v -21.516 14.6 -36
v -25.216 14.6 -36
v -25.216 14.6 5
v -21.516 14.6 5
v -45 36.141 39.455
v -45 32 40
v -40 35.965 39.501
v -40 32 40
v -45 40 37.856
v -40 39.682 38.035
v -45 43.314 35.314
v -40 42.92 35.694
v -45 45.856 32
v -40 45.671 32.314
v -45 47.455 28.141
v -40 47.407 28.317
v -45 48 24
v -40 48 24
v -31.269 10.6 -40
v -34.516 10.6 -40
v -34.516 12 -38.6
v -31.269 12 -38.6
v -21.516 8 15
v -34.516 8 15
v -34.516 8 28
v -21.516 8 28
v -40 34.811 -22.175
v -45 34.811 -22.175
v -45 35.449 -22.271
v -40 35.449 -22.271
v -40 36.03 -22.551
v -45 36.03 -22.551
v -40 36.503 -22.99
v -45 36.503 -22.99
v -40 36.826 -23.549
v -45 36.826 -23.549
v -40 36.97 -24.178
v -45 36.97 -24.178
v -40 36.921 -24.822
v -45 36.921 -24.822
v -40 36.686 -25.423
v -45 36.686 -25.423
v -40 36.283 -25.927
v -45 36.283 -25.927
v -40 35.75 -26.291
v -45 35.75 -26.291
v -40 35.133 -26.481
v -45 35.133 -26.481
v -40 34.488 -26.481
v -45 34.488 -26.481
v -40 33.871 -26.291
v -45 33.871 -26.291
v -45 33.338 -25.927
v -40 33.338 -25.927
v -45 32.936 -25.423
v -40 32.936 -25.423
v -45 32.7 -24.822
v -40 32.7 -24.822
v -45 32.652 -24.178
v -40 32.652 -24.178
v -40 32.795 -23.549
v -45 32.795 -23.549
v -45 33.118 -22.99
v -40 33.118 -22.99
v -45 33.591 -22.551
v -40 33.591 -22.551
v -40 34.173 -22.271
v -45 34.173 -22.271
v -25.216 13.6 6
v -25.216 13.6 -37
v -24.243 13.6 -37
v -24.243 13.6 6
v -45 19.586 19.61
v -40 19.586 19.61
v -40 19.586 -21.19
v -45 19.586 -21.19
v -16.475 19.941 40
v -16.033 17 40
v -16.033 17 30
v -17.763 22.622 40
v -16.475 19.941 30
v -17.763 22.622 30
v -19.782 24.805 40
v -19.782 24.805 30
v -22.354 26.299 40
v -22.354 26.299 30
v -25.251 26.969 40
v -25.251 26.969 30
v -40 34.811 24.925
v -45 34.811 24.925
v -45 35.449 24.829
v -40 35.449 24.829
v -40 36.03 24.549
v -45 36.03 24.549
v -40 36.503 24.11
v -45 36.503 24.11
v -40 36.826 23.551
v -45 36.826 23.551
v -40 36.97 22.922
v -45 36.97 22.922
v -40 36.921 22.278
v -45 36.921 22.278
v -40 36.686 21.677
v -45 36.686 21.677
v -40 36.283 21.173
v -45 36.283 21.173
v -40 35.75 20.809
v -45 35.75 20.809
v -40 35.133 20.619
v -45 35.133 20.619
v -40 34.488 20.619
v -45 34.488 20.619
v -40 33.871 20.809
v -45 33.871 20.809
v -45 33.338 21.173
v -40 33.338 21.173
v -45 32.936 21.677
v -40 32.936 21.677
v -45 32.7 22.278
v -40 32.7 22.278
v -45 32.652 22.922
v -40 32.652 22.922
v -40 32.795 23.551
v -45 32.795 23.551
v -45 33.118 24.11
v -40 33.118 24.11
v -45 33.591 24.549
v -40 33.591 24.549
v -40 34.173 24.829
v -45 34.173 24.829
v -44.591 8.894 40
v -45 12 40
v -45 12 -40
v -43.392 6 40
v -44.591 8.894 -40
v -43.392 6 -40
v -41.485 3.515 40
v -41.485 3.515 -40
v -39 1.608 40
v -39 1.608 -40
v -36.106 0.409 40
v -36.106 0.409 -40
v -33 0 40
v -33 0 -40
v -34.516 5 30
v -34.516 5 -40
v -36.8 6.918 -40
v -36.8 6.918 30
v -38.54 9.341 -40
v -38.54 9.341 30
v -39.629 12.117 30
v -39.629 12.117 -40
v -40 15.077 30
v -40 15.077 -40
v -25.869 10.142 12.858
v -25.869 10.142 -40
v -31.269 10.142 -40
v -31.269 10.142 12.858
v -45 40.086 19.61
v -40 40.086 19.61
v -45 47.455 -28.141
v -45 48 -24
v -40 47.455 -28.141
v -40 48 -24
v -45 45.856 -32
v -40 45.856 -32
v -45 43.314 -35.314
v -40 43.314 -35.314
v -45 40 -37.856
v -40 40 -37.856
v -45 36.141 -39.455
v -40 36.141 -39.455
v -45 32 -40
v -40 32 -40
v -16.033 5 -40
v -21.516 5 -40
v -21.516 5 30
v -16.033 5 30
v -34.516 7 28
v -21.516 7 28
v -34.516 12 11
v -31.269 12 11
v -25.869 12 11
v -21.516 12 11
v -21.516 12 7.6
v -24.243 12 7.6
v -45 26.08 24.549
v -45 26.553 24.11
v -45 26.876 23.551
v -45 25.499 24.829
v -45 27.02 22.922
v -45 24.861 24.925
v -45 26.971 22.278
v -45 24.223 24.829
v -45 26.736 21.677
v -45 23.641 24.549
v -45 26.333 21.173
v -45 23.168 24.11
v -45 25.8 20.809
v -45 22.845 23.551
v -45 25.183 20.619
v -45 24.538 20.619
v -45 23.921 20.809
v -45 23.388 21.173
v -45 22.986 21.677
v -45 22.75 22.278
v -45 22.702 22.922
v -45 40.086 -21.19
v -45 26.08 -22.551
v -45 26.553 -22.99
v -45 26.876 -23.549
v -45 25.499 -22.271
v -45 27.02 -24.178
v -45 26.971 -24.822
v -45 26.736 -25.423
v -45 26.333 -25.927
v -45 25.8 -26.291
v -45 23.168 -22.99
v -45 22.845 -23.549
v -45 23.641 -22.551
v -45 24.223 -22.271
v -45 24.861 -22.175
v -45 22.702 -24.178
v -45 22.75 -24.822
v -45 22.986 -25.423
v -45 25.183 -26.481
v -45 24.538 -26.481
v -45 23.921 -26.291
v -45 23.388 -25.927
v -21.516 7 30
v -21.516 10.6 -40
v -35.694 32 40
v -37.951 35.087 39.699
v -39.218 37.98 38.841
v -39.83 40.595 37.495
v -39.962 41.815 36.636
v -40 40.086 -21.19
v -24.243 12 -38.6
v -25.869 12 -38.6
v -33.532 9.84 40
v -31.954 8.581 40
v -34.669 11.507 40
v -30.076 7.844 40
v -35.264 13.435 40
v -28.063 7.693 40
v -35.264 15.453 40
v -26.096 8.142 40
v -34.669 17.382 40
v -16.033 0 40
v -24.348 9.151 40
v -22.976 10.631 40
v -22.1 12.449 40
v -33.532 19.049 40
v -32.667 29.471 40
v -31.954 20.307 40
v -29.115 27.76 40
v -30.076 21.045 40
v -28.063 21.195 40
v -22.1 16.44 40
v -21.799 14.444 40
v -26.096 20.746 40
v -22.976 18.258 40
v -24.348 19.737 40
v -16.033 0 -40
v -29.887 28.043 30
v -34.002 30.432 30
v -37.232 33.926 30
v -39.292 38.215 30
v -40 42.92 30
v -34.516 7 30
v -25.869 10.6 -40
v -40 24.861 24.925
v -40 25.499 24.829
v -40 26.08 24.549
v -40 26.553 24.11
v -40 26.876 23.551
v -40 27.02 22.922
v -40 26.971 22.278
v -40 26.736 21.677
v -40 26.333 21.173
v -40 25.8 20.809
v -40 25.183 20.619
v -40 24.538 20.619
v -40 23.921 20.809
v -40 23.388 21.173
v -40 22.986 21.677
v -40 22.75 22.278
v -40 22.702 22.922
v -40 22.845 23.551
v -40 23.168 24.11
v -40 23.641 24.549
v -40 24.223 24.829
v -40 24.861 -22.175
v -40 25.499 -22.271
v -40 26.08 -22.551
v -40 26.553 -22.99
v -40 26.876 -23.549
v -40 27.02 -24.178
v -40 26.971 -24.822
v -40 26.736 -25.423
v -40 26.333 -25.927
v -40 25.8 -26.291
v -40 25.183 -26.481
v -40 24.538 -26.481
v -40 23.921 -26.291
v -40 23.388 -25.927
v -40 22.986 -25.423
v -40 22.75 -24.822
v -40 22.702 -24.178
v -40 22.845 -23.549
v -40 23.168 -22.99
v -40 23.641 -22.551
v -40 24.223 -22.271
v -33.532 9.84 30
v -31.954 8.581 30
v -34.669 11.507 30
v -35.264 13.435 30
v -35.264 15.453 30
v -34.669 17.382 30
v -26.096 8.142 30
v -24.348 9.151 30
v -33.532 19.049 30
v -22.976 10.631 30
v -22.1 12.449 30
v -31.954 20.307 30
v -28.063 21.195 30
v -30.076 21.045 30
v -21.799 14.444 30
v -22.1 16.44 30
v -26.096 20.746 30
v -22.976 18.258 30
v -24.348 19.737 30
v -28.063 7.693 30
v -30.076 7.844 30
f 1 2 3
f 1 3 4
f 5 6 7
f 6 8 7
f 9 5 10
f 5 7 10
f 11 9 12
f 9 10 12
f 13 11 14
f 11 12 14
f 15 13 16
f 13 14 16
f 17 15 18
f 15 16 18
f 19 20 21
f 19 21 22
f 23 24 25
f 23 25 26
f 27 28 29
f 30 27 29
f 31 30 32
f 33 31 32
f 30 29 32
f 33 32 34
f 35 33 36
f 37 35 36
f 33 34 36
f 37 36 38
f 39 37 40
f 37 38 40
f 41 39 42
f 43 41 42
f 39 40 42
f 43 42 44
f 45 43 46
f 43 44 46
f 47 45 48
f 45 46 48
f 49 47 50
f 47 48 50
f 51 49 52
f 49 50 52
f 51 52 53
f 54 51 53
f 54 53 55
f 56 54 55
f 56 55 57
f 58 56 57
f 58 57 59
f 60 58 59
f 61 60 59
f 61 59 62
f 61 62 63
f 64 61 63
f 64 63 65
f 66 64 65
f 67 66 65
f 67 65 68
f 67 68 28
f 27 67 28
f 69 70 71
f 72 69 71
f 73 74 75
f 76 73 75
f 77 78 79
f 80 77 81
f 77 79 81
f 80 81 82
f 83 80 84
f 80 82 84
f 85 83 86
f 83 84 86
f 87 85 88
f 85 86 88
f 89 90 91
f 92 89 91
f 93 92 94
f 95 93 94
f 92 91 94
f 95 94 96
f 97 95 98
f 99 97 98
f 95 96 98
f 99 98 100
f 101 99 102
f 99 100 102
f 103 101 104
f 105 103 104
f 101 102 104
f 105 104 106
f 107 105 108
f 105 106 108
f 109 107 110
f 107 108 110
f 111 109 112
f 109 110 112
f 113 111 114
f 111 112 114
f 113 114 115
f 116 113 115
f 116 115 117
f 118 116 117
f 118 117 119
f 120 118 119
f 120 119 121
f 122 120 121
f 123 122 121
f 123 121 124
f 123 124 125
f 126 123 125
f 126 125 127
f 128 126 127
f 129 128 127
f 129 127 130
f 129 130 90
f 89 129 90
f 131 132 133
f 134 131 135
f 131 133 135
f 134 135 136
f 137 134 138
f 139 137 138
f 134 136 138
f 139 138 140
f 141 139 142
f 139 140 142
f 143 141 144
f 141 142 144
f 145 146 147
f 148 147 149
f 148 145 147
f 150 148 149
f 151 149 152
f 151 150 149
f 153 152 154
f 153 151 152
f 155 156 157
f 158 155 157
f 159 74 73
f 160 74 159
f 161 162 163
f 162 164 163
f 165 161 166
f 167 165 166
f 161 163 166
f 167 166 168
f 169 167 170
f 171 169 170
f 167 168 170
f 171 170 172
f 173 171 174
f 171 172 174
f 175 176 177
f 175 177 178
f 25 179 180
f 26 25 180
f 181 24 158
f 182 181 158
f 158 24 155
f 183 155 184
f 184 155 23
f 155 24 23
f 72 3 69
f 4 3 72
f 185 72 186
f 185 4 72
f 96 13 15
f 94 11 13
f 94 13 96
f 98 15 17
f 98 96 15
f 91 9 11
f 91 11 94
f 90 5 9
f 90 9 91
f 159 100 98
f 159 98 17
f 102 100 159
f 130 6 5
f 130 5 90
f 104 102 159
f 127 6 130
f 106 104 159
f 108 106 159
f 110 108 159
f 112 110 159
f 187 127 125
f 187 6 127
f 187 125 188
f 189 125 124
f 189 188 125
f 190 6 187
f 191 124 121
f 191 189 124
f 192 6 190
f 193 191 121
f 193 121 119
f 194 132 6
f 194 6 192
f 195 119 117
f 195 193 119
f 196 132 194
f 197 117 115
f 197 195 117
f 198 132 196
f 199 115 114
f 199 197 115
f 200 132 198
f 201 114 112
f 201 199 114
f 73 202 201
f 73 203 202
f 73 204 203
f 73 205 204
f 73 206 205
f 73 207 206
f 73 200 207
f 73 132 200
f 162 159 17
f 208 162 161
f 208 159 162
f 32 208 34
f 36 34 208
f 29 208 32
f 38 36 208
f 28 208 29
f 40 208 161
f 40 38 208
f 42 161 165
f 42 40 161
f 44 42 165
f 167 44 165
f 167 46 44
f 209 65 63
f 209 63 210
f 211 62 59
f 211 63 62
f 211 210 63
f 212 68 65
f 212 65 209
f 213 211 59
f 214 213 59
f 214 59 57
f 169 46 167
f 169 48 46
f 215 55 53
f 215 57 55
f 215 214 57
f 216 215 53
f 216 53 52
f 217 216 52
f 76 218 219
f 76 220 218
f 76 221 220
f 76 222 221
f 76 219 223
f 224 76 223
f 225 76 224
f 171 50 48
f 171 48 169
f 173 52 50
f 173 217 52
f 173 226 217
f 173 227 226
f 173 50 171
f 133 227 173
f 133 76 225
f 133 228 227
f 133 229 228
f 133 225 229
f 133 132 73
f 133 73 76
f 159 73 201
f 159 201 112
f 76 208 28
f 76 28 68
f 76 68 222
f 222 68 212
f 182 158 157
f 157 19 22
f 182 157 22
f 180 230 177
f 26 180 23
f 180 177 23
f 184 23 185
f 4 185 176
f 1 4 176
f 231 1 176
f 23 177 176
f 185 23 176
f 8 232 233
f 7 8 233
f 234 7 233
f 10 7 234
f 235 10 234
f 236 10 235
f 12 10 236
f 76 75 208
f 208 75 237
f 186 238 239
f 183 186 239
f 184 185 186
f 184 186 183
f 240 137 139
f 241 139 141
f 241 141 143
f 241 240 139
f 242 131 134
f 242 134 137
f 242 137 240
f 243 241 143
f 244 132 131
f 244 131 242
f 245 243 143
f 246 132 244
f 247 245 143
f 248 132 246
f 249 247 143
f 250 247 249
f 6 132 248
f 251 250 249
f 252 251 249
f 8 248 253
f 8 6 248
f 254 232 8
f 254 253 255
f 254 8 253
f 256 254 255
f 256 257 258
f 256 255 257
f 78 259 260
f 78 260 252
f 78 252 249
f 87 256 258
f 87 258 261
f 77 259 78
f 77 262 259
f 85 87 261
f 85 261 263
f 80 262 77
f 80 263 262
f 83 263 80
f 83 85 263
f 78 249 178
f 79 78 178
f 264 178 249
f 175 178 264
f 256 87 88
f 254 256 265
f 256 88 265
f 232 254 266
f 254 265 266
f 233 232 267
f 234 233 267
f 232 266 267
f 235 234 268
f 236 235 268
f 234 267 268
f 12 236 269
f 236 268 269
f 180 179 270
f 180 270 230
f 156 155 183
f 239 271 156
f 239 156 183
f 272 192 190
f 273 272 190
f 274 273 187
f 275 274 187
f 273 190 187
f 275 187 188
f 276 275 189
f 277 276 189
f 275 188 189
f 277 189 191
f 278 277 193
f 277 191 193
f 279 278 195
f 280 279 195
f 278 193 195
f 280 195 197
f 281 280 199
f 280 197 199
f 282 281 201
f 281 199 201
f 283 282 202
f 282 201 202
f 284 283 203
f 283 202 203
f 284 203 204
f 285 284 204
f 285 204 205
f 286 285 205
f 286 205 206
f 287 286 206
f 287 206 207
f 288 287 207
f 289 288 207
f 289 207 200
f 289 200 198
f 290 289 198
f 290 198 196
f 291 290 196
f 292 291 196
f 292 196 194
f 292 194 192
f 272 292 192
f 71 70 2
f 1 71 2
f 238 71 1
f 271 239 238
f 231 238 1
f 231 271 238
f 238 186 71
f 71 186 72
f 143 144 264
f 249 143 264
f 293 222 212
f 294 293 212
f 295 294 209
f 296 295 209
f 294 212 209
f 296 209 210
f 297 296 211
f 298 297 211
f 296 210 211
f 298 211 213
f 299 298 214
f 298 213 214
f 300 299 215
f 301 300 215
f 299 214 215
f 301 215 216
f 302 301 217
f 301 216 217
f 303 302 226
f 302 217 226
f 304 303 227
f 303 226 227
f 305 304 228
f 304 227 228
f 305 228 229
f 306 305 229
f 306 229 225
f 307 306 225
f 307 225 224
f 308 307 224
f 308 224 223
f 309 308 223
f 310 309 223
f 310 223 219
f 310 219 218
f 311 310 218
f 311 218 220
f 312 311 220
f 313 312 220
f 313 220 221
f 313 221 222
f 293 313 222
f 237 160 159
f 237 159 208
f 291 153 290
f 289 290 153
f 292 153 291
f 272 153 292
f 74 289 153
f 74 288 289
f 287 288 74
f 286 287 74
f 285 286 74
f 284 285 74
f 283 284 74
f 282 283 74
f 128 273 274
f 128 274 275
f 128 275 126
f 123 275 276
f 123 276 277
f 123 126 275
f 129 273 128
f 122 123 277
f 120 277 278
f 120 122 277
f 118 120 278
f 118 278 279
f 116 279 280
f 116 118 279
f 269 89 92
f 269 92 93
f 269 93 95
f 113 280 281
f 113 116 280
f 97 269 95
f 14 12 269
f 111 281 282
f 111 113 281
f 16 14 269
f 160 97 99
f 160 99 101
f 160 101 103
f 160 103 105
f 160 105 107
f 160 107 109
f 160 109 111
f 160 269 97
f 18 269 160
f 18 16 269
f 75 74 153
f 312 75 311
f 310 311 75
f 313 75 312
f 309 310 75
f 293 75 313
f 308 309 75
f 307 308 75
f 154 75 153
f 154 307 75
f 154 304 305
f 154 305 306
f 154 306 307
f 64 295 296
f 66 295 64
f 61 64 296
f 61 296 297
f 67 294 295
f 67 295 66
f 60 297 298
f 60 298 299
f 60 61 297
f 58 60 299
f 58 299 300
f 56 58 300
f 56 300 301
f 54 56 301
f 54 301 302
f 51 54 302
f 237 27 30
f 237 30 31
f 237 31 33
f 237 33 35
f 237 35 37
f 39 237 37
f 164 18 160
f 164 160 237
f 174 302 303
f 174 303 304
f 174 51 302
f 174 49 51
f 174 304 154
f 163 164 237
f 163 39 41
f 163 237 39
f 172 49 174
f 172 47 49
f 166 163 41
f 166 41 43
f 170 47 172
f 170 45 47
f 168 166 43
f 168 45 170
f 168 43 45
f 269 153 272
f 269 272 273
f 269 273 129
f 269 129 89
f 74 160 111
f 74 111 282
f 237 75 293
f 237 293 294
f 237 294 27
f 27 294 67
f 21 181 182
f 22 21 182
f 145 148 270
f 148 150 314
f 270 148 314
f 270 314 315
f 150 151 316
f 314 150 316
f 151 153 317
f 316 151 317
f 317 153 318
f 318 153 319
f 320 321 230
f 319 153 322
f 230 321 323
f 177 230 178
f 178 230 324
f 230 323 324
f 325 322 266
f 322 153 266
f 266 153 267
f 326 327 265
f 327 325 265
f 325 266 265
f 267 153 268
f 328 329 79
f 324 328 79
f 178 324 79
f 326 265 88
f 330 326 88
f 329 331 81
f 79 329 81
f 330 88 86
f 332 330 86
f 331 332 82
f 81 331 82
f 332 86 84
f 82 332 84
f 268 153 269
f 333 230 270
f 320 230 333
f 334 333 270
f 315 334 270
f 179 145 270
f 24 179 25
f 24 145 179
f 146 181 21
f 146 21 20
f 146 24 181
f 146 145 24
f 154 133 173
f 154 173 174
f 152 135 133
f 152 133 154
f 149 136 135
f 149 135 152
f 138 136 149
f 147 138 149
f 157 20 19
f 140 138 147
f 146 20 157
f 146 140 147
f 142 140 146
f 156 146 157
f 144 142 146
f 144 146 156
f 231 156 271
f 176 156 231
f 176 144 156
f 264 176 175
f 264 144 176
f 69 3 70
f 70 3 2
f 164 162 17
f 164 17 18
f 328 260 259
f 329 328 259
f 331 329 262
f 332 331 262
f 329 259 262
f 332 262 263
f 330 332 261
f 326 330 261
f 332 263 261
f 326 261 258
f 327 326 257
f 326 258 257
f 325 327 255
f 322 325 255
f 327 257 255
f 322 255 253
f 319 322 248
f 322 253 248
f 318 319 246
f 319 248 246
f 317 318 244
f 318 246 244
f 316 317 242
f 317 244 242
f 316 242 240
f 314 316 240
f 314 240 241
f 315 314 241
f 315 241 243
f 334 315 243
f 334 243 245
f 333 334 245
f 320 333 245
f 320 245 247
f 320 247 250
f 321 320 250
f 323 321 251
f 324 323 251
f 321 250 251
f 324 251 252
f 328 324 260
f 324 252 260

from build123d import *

# Parameters (mm, degrees)
CROQUIS1_W              = 90
CROQUIS1_H              = 80
SALIENTE_EXTRUIR1_DEPTH = 50
CROQUIS2_W              = 85
CROQUIS2_H              = 80
CORTAR_EXTRUIR1_DEPTH   = 23
CROQUIS3_W              = 61.032840672
CROQUIS3_H              = 80
CORTAR_EXTRUIR2_DEPTH   = 32
CROQUIS4_W              = 23.967159328
CROQUIS4_H              = 70
CORTAR_EXTRUIR3_DEPTH   = 22
CROQUIS7_R              = 6.77
CORTAR_EXTRUIR6_DEPTH   = 10
CROQUIS11_W             = 13
CROQUIS11_H             = 70
SALIENTE_EXTRUIR2_DEPTH = 2
CROQUIS12_W             = 13
CROQUIS12_H             = 55
SALIENTE_EXTRUIR3_DEPTH = 5
REDONDEO3_R             = 12
REDONDEO4_R             = 12
CROQUIS14_W             = 13
CROQUIS14_H             = 13
SALIENTE_EXTRUIR4_DEPTH = 1
CROQUIS17_W             = 2.726828244
CROQUIS17_H             = 50
SALIENTE_EXTRUIR5_DEPTH = 1.6
CROQUIS18_W             = 5
CROQUIS18_H             = 50
SALIENTE_EXTRUIR6_DEPTH = 1
CHAFL_N2_SIZE           = 4
CHAFL_N4_SIZE           = 4
CROQUIS19_R             = 2.165
CORTAR_EXTRUIR10_DEPTH  = 10
CROQUIS20_W             = 5.4
CROQUIS20_H             = 1.857846889
CORTAR_EXTRUIR11_DEPTH  = 80
REDONDEO10_R            = 10
CROQUIS23_W             = 40.8
CROQUIS23_H             = 20.5
CORTAR_EXTRUIR12_DEPTH  = 22
CROQUIS24_W             = 5
CROQUIS24_H             = 80
CORTAR_EXTRUIR14_DEPTH  = 2
REDONDEO13_R            = 16
REDONDEO14_START        = 30
REDONDEO14_DEPTH        = 2.2192
REDONDEO14_START_2      = 32.2192
REDONDEO14_2_DEPTH      = 7.7808
REDONDEO14_START_3      = -40
REDONDEO14_3_DEPTH      = 14.749021125
CORTAR_EXTRUIR16_DEPTH  = 1.3
CHAFL_N5_SIZE           = 5


with BuildPart() as part:
    # Croquis1 → Saliente-Extruir1 (new body)
    with BuildSketch(Plane(origin=(0, 0, 0), x_dir=(1, 0, 0), z_dir=(0, 1, 0))):
        Rectangle(CROQUIS1_W, CROQUIS1_H)
    extrude(amount=SALIENTE_EXTRUIR1_DEPTH)

    # Croquis2 → Cortar-Extruir1 (cut)
    with BuildSketch(Plane(origin=(0, 50, 0), x_dir=(1, 0, 0), z_dir=(0, 1, 0))):
        with Locations((2.5, 0)):
            Rectangle(CROQUIS2_W, CROQUIS2_H)
    extrude(amount=-CORTAR_EXTRUIR1_DEPTH, mode=Mode.SUBTRACT)

    # Croquis3 → Cortar-Extruir2 (cut)
    with BuildSketch(Plane(origin=(0, 27, 0), x_dir=(1, 0, 0), z_dir=(0, 1, 0))):
        with Locations((14.483579664, 0)):
            Rectangle(CROQUIS3_W, CROQUIS3_H)
    extrude(amount=-CORTAR_EXTRUIR2_DEPTH, mode=Mode.SUBTRACT)

    # Croquis4 → Cortar-Extruir3 (cut)
    with BuildSketch(Plane(origin=(0, 27, 0), x_dir=(1, 0, 0), z_dir=(0, 1, 0))):
        with Locations((-28.016420336, 5)):
            Rectangle(CROQUIS4_W, CROQUIS4_H)
    extrude(amount=-CORTAR_EXTRUIR3_DEPTH, mode=Mode.SUBTRACT)

    # Croquis7 → Cortar-Extruir6 (cut)
    with BuildSketch(Plane.XY.offset(40)):
        with Locations((-28.569213332, 14.444335644)):
            Circle(CROQUIS7_R)
    extrude(amount=-CORTAR_EXTRUIR6_DEPTH, mode=Mode.SUBTRACT)

    # Croquis11 → Saliente-Extruir2 (add)
    with BuildSketch(Plane(origin=(0, 5, 0), x_dir=(1, 0, 0), z_dir=(0, 1, 0))):
        with Locations((-28.016420336, 5)):
            Rectangle(CROQUIS11_W, CROQUIS11_H)
    extrude(amount=SALIENTE_EXTRUIR2_DEPTH)

    # Croquis12 → Saliente-Extruir3 (add)
    with BuildSketch(Plane(origin=(0, 7, 0), x_dir=(1, 0, 0), z_dir=(0, 1, 0))):
        with Locations((-28.016420336, 12.5)):
            Rectangle(CROQUIS12_W, CROQUIS12_H)
    extrude(amount=SALIENTE_EXTRUIR3_DEPTH)

    # Redondeo3
    # the kernel refuses this fillet: 12 mm, written as the material it adds along each edge
    with BuildSketch(Plane(origin=(-40, 5, 30), x_dir=(1.0, 1.01847082473682e-12, 0), z_dir=(0, 0, -1))) as redondeo3_piece_1:
        with BuildLine():
            CenterArc((12, -10.076520531), REDONDEO3_R, 122.890486336, 57.109513664)
            Line((0, -10.076520531), (-0.24, -10.076520531))
            Line((-0.24, -10.076520531), (-0.24, 0))
            Line((-0.24, 0), (0, 0.24))
            ThreePointArc((0, 0.24), (2.741789832, 0.24), (5.353251257, 0.201530411))
            Line((5.353251257, 0.201530411), (5.483579664, 0))
        make_face()
    extrude(amount=70)

    # Redondeo4
    redondeo4_edges = [part.edges().sort_by_distance(p)[0] for p in [
        (-45, 0, 0),
    ]]
    fillet(redondeo4_edges, radius=REDONDEO4_R)

    # Croquis14 → Saliente-Extruir4 (add)
    with BuildSketch(Plane(origin=(0, 7, 0), x_dir=(1, 0, 0), z_dir=(0, 1, 0))):
        with Locations((-28.016420336, -21.5)):
            Rectangle(CROQUIS14_W, CROQUIS14_H)
    extrude(amount=SALIENTE_EXTRUIR4_DEPTH)

    # Croquis17 → Saliente-Extruir5 (add)
    with BuildSketch(Plane(origin=(0, 12, 0), x_dir=(1, 0, 0), z_dir=(0, 1, 0))):
        with Locations((-22.879834458, 15)):
            Rectangle(CROQUIS17_W, CROQUIS17_H)
    extrude(amount=SALIENTE_EXTRUIR5_DEPTH)

    # Croquis18 → Saliente-Extruir6 (add)
    with BuildSketch(Plane(origin=(0, 13.6, 0), x_dir=(1, 0, 0), z_dir=(0, 1, 0))):
        with Locations((-24.016420336, 15)):
            Rectangle(CROQUIS18_W, CROQUIS18_H)
    extrude(amount=SALIENTE_EXTRUIR6_DEPTH)

    # Chaflán2
    chafl_n2_edges = [part.edges().sort_by_distance(p)[0] for p in [
        (-28.016420336, 12, 15),
    ]]
    chamfer(chafl_n2_edges, length=CHAFL_N2_SIZE - 0.0001)  # a hair under: the kernel refuses the full size

    # Chaflán4
    chafl_n4_edges = [part.edges().sort_by_distance(p)[0] for p in [
        (-24.016420336, 14.6, -40),
    ]]
    chamfer(chafl_n4_edges, length=CHAFL_N4_SIZE)

    # Croquis19 → Cortar-Extruir10 (cut)
    with BuildSketch(Plane.ZY.offset(45)):
        with Locations((-24.340228639, 34.810686035)):
            Circle(CROQUIS19_R)
        with Locations((-24.340228639, 24.860686035)):
            Circle(CROQUIS19_R)
        with Locations((22.759771361, 34.810686035)):
            Circle(CROQUIS19_R)
        with Locations((22.759771361, 24.860686035)):
            Circle(CROQUIS19_R)
    extrude(amount=-CORTAR_EXTRUIR10_DEPTH, mode=Mode.SUBTRACT)

    # Croquis20 → Cortar-Extruir11 (cut)
    with BuildSketch(Plane(origin=(0, 0, -40), x_dir=(-1, 0, 0), z_dir=(0, 0, -1))):
        with Locations((28.569213332, 11.071076555)):
            Rectangle(CROQUIS20_W, CROQUIS20_H)
    extrude(amount=-CORTAR_EXTRUIR11_DEPTH, mode=Mode.SUBTRACT)

    # Redondeo10
    redondeo10_edges = [part.edges().sort_by_distance(p)[0] for p in [
        (-16.032840672, 27, 35),
    ]]
    fillet(redondeo10_edges, radius=REDONDEO10_R)

    # Croquis23 → Cortar-Extruir12 (cut)
    with BuildSketch(Plane(origin=(-40, 0, 0), x_dir=(0, 0, -1), z_dir=(1, 0, 0))):
        with Locations((0.790228639, 29.835686035)):
            Rectangle(CROQUIS23_W, CROQUIS23_H)
    extrude(amount=-CORTAR_EXTRUIR12_DEPTH, mode=Mode.SUBTRACT)

    # Croquis24 → Cortar-Extruir14 (cut)
    with BuildSketch(Plane(origin=(0, 50, 0), x_dir=(1, 0, 0), z_dir=(0, 1, 0))):
        with Locations((-42.5, 0)):
            Rectangle(CROQUIS24_W, CROQUIS24_H)
    extrude(amount=-CORTAR_EXTRUIR14_DEPTH, mode=Mode.SUBTRACT)

    # Redondeo13
    redondeo13_edges = [part.edges().sort_by_distance(p)[0] for p in [
        (-42.5, 48, -40),
        (-42.5, 48, 40),
    ]]
    fillet(redondeo13_edges, radius=REDONDEO13_R)

    # Redondeo14: read off the stored shape, not the designer's step
    # Redondeo14 outline → Redondeo14 (add)
    with BuildSketch(Plane.XY.offset(REDONDEO14_START)):
        with BuildLine():
            ThreePointArc((-26.032840672, 27), (-25.641610248, 26.992344007), (-25.250978875, 26.969387751))
            ThreePointArc((-25.250978875, 26.969387751), (-35.747673429, 32.057988118), (-40, 42.920408153))
            Line((-40, 42.920408153), (-40, 27))
            Line((-40, 27), (-26.032840672, 27))
        make_face()
    extrude(amount=REDONDEO14_DEPTH)

    # Redondeo14 2 outline → Redondeo14 2 (add)
    with BuildSketch(Plane.XY.offset(REDONDEO14_START_2)):
        with BuildLine():
            ThreePointArc((-26.032840672, 27), (-25.641610248, 26.992344007), (-25.250978875, 26.969387751))
            ThreePointArc((-25.250978875, 26.969387751), (-35.747673429, 32.057988118), (-40, 42.920408153))
            Line((-40, 42.920408153), (-40, 27))
            Line((-40, 27), (-26.032840672, 27))
        make_face()
    extrude(amount=REDONDEO14_2_DEPTH)

    # Redondeo14 3 outline → Redondeo14 3 (cut)
    with BuildSketch(Plane.YZ.offset(REDONDEO14_START_3)):
        with BuildLine():
            Line((31, 40), (32, 40))
            ThreePointArc((32, 40), (38.583005244, 38.583005244), (44, 34.583005244))
            Line((44, 34.583005244), (44, 41))
            Line((44, 41), (31, 41))
            Line((31, 41), (31, 40))
        make_face()
    extrude(amount=REDONDEO14_3_DEPTH, mode=Mode.SUBTRACT)

    # Croquis25 → Cortar-Extruir16 (cut)
    with BuildSketch(Plane.ZY.offset(26.516420336)):
        Polygon((-36, 14.6), (10, 14.6), (10, 13.6), (-37, 13.6), align=None)
    extrude(amount=-CORTAR_EXTRUIR16_DEPTH, mode=Mode.SUBTRACT)

    # Chaflán5
    # the kernel refuses this chamfer: 5 mm, written as the material it takes off along each edge
    with BuildSketch(Plane(origin=(-8.658005396, 14.6, 10), x_dir=(0, 0, -1), z_dir=(-1, 0, 0))) as chafl_n5_piece_1_section:
        Polygon((CHAFL_N5_SIZE, 0), (0, CHAFL_N5_SIZE), (0, 0), align=None)
    chafl_n5_piece_1 = extrude(amount=29.41682988, mode=Mode.PRIVATE)
    chafl_n5_piece_1 = split(chafl_n5_piece_1, bisect_by=Plane(origin=(-8.658005396, 12, 10), z_dir=(0, 1, 0)), keep=Keep.TOP, mode=Mode.PRIVATE)
    add(chafl_n5_piece_1, mode=Mode.SUBTRACT)


solid = part.part
